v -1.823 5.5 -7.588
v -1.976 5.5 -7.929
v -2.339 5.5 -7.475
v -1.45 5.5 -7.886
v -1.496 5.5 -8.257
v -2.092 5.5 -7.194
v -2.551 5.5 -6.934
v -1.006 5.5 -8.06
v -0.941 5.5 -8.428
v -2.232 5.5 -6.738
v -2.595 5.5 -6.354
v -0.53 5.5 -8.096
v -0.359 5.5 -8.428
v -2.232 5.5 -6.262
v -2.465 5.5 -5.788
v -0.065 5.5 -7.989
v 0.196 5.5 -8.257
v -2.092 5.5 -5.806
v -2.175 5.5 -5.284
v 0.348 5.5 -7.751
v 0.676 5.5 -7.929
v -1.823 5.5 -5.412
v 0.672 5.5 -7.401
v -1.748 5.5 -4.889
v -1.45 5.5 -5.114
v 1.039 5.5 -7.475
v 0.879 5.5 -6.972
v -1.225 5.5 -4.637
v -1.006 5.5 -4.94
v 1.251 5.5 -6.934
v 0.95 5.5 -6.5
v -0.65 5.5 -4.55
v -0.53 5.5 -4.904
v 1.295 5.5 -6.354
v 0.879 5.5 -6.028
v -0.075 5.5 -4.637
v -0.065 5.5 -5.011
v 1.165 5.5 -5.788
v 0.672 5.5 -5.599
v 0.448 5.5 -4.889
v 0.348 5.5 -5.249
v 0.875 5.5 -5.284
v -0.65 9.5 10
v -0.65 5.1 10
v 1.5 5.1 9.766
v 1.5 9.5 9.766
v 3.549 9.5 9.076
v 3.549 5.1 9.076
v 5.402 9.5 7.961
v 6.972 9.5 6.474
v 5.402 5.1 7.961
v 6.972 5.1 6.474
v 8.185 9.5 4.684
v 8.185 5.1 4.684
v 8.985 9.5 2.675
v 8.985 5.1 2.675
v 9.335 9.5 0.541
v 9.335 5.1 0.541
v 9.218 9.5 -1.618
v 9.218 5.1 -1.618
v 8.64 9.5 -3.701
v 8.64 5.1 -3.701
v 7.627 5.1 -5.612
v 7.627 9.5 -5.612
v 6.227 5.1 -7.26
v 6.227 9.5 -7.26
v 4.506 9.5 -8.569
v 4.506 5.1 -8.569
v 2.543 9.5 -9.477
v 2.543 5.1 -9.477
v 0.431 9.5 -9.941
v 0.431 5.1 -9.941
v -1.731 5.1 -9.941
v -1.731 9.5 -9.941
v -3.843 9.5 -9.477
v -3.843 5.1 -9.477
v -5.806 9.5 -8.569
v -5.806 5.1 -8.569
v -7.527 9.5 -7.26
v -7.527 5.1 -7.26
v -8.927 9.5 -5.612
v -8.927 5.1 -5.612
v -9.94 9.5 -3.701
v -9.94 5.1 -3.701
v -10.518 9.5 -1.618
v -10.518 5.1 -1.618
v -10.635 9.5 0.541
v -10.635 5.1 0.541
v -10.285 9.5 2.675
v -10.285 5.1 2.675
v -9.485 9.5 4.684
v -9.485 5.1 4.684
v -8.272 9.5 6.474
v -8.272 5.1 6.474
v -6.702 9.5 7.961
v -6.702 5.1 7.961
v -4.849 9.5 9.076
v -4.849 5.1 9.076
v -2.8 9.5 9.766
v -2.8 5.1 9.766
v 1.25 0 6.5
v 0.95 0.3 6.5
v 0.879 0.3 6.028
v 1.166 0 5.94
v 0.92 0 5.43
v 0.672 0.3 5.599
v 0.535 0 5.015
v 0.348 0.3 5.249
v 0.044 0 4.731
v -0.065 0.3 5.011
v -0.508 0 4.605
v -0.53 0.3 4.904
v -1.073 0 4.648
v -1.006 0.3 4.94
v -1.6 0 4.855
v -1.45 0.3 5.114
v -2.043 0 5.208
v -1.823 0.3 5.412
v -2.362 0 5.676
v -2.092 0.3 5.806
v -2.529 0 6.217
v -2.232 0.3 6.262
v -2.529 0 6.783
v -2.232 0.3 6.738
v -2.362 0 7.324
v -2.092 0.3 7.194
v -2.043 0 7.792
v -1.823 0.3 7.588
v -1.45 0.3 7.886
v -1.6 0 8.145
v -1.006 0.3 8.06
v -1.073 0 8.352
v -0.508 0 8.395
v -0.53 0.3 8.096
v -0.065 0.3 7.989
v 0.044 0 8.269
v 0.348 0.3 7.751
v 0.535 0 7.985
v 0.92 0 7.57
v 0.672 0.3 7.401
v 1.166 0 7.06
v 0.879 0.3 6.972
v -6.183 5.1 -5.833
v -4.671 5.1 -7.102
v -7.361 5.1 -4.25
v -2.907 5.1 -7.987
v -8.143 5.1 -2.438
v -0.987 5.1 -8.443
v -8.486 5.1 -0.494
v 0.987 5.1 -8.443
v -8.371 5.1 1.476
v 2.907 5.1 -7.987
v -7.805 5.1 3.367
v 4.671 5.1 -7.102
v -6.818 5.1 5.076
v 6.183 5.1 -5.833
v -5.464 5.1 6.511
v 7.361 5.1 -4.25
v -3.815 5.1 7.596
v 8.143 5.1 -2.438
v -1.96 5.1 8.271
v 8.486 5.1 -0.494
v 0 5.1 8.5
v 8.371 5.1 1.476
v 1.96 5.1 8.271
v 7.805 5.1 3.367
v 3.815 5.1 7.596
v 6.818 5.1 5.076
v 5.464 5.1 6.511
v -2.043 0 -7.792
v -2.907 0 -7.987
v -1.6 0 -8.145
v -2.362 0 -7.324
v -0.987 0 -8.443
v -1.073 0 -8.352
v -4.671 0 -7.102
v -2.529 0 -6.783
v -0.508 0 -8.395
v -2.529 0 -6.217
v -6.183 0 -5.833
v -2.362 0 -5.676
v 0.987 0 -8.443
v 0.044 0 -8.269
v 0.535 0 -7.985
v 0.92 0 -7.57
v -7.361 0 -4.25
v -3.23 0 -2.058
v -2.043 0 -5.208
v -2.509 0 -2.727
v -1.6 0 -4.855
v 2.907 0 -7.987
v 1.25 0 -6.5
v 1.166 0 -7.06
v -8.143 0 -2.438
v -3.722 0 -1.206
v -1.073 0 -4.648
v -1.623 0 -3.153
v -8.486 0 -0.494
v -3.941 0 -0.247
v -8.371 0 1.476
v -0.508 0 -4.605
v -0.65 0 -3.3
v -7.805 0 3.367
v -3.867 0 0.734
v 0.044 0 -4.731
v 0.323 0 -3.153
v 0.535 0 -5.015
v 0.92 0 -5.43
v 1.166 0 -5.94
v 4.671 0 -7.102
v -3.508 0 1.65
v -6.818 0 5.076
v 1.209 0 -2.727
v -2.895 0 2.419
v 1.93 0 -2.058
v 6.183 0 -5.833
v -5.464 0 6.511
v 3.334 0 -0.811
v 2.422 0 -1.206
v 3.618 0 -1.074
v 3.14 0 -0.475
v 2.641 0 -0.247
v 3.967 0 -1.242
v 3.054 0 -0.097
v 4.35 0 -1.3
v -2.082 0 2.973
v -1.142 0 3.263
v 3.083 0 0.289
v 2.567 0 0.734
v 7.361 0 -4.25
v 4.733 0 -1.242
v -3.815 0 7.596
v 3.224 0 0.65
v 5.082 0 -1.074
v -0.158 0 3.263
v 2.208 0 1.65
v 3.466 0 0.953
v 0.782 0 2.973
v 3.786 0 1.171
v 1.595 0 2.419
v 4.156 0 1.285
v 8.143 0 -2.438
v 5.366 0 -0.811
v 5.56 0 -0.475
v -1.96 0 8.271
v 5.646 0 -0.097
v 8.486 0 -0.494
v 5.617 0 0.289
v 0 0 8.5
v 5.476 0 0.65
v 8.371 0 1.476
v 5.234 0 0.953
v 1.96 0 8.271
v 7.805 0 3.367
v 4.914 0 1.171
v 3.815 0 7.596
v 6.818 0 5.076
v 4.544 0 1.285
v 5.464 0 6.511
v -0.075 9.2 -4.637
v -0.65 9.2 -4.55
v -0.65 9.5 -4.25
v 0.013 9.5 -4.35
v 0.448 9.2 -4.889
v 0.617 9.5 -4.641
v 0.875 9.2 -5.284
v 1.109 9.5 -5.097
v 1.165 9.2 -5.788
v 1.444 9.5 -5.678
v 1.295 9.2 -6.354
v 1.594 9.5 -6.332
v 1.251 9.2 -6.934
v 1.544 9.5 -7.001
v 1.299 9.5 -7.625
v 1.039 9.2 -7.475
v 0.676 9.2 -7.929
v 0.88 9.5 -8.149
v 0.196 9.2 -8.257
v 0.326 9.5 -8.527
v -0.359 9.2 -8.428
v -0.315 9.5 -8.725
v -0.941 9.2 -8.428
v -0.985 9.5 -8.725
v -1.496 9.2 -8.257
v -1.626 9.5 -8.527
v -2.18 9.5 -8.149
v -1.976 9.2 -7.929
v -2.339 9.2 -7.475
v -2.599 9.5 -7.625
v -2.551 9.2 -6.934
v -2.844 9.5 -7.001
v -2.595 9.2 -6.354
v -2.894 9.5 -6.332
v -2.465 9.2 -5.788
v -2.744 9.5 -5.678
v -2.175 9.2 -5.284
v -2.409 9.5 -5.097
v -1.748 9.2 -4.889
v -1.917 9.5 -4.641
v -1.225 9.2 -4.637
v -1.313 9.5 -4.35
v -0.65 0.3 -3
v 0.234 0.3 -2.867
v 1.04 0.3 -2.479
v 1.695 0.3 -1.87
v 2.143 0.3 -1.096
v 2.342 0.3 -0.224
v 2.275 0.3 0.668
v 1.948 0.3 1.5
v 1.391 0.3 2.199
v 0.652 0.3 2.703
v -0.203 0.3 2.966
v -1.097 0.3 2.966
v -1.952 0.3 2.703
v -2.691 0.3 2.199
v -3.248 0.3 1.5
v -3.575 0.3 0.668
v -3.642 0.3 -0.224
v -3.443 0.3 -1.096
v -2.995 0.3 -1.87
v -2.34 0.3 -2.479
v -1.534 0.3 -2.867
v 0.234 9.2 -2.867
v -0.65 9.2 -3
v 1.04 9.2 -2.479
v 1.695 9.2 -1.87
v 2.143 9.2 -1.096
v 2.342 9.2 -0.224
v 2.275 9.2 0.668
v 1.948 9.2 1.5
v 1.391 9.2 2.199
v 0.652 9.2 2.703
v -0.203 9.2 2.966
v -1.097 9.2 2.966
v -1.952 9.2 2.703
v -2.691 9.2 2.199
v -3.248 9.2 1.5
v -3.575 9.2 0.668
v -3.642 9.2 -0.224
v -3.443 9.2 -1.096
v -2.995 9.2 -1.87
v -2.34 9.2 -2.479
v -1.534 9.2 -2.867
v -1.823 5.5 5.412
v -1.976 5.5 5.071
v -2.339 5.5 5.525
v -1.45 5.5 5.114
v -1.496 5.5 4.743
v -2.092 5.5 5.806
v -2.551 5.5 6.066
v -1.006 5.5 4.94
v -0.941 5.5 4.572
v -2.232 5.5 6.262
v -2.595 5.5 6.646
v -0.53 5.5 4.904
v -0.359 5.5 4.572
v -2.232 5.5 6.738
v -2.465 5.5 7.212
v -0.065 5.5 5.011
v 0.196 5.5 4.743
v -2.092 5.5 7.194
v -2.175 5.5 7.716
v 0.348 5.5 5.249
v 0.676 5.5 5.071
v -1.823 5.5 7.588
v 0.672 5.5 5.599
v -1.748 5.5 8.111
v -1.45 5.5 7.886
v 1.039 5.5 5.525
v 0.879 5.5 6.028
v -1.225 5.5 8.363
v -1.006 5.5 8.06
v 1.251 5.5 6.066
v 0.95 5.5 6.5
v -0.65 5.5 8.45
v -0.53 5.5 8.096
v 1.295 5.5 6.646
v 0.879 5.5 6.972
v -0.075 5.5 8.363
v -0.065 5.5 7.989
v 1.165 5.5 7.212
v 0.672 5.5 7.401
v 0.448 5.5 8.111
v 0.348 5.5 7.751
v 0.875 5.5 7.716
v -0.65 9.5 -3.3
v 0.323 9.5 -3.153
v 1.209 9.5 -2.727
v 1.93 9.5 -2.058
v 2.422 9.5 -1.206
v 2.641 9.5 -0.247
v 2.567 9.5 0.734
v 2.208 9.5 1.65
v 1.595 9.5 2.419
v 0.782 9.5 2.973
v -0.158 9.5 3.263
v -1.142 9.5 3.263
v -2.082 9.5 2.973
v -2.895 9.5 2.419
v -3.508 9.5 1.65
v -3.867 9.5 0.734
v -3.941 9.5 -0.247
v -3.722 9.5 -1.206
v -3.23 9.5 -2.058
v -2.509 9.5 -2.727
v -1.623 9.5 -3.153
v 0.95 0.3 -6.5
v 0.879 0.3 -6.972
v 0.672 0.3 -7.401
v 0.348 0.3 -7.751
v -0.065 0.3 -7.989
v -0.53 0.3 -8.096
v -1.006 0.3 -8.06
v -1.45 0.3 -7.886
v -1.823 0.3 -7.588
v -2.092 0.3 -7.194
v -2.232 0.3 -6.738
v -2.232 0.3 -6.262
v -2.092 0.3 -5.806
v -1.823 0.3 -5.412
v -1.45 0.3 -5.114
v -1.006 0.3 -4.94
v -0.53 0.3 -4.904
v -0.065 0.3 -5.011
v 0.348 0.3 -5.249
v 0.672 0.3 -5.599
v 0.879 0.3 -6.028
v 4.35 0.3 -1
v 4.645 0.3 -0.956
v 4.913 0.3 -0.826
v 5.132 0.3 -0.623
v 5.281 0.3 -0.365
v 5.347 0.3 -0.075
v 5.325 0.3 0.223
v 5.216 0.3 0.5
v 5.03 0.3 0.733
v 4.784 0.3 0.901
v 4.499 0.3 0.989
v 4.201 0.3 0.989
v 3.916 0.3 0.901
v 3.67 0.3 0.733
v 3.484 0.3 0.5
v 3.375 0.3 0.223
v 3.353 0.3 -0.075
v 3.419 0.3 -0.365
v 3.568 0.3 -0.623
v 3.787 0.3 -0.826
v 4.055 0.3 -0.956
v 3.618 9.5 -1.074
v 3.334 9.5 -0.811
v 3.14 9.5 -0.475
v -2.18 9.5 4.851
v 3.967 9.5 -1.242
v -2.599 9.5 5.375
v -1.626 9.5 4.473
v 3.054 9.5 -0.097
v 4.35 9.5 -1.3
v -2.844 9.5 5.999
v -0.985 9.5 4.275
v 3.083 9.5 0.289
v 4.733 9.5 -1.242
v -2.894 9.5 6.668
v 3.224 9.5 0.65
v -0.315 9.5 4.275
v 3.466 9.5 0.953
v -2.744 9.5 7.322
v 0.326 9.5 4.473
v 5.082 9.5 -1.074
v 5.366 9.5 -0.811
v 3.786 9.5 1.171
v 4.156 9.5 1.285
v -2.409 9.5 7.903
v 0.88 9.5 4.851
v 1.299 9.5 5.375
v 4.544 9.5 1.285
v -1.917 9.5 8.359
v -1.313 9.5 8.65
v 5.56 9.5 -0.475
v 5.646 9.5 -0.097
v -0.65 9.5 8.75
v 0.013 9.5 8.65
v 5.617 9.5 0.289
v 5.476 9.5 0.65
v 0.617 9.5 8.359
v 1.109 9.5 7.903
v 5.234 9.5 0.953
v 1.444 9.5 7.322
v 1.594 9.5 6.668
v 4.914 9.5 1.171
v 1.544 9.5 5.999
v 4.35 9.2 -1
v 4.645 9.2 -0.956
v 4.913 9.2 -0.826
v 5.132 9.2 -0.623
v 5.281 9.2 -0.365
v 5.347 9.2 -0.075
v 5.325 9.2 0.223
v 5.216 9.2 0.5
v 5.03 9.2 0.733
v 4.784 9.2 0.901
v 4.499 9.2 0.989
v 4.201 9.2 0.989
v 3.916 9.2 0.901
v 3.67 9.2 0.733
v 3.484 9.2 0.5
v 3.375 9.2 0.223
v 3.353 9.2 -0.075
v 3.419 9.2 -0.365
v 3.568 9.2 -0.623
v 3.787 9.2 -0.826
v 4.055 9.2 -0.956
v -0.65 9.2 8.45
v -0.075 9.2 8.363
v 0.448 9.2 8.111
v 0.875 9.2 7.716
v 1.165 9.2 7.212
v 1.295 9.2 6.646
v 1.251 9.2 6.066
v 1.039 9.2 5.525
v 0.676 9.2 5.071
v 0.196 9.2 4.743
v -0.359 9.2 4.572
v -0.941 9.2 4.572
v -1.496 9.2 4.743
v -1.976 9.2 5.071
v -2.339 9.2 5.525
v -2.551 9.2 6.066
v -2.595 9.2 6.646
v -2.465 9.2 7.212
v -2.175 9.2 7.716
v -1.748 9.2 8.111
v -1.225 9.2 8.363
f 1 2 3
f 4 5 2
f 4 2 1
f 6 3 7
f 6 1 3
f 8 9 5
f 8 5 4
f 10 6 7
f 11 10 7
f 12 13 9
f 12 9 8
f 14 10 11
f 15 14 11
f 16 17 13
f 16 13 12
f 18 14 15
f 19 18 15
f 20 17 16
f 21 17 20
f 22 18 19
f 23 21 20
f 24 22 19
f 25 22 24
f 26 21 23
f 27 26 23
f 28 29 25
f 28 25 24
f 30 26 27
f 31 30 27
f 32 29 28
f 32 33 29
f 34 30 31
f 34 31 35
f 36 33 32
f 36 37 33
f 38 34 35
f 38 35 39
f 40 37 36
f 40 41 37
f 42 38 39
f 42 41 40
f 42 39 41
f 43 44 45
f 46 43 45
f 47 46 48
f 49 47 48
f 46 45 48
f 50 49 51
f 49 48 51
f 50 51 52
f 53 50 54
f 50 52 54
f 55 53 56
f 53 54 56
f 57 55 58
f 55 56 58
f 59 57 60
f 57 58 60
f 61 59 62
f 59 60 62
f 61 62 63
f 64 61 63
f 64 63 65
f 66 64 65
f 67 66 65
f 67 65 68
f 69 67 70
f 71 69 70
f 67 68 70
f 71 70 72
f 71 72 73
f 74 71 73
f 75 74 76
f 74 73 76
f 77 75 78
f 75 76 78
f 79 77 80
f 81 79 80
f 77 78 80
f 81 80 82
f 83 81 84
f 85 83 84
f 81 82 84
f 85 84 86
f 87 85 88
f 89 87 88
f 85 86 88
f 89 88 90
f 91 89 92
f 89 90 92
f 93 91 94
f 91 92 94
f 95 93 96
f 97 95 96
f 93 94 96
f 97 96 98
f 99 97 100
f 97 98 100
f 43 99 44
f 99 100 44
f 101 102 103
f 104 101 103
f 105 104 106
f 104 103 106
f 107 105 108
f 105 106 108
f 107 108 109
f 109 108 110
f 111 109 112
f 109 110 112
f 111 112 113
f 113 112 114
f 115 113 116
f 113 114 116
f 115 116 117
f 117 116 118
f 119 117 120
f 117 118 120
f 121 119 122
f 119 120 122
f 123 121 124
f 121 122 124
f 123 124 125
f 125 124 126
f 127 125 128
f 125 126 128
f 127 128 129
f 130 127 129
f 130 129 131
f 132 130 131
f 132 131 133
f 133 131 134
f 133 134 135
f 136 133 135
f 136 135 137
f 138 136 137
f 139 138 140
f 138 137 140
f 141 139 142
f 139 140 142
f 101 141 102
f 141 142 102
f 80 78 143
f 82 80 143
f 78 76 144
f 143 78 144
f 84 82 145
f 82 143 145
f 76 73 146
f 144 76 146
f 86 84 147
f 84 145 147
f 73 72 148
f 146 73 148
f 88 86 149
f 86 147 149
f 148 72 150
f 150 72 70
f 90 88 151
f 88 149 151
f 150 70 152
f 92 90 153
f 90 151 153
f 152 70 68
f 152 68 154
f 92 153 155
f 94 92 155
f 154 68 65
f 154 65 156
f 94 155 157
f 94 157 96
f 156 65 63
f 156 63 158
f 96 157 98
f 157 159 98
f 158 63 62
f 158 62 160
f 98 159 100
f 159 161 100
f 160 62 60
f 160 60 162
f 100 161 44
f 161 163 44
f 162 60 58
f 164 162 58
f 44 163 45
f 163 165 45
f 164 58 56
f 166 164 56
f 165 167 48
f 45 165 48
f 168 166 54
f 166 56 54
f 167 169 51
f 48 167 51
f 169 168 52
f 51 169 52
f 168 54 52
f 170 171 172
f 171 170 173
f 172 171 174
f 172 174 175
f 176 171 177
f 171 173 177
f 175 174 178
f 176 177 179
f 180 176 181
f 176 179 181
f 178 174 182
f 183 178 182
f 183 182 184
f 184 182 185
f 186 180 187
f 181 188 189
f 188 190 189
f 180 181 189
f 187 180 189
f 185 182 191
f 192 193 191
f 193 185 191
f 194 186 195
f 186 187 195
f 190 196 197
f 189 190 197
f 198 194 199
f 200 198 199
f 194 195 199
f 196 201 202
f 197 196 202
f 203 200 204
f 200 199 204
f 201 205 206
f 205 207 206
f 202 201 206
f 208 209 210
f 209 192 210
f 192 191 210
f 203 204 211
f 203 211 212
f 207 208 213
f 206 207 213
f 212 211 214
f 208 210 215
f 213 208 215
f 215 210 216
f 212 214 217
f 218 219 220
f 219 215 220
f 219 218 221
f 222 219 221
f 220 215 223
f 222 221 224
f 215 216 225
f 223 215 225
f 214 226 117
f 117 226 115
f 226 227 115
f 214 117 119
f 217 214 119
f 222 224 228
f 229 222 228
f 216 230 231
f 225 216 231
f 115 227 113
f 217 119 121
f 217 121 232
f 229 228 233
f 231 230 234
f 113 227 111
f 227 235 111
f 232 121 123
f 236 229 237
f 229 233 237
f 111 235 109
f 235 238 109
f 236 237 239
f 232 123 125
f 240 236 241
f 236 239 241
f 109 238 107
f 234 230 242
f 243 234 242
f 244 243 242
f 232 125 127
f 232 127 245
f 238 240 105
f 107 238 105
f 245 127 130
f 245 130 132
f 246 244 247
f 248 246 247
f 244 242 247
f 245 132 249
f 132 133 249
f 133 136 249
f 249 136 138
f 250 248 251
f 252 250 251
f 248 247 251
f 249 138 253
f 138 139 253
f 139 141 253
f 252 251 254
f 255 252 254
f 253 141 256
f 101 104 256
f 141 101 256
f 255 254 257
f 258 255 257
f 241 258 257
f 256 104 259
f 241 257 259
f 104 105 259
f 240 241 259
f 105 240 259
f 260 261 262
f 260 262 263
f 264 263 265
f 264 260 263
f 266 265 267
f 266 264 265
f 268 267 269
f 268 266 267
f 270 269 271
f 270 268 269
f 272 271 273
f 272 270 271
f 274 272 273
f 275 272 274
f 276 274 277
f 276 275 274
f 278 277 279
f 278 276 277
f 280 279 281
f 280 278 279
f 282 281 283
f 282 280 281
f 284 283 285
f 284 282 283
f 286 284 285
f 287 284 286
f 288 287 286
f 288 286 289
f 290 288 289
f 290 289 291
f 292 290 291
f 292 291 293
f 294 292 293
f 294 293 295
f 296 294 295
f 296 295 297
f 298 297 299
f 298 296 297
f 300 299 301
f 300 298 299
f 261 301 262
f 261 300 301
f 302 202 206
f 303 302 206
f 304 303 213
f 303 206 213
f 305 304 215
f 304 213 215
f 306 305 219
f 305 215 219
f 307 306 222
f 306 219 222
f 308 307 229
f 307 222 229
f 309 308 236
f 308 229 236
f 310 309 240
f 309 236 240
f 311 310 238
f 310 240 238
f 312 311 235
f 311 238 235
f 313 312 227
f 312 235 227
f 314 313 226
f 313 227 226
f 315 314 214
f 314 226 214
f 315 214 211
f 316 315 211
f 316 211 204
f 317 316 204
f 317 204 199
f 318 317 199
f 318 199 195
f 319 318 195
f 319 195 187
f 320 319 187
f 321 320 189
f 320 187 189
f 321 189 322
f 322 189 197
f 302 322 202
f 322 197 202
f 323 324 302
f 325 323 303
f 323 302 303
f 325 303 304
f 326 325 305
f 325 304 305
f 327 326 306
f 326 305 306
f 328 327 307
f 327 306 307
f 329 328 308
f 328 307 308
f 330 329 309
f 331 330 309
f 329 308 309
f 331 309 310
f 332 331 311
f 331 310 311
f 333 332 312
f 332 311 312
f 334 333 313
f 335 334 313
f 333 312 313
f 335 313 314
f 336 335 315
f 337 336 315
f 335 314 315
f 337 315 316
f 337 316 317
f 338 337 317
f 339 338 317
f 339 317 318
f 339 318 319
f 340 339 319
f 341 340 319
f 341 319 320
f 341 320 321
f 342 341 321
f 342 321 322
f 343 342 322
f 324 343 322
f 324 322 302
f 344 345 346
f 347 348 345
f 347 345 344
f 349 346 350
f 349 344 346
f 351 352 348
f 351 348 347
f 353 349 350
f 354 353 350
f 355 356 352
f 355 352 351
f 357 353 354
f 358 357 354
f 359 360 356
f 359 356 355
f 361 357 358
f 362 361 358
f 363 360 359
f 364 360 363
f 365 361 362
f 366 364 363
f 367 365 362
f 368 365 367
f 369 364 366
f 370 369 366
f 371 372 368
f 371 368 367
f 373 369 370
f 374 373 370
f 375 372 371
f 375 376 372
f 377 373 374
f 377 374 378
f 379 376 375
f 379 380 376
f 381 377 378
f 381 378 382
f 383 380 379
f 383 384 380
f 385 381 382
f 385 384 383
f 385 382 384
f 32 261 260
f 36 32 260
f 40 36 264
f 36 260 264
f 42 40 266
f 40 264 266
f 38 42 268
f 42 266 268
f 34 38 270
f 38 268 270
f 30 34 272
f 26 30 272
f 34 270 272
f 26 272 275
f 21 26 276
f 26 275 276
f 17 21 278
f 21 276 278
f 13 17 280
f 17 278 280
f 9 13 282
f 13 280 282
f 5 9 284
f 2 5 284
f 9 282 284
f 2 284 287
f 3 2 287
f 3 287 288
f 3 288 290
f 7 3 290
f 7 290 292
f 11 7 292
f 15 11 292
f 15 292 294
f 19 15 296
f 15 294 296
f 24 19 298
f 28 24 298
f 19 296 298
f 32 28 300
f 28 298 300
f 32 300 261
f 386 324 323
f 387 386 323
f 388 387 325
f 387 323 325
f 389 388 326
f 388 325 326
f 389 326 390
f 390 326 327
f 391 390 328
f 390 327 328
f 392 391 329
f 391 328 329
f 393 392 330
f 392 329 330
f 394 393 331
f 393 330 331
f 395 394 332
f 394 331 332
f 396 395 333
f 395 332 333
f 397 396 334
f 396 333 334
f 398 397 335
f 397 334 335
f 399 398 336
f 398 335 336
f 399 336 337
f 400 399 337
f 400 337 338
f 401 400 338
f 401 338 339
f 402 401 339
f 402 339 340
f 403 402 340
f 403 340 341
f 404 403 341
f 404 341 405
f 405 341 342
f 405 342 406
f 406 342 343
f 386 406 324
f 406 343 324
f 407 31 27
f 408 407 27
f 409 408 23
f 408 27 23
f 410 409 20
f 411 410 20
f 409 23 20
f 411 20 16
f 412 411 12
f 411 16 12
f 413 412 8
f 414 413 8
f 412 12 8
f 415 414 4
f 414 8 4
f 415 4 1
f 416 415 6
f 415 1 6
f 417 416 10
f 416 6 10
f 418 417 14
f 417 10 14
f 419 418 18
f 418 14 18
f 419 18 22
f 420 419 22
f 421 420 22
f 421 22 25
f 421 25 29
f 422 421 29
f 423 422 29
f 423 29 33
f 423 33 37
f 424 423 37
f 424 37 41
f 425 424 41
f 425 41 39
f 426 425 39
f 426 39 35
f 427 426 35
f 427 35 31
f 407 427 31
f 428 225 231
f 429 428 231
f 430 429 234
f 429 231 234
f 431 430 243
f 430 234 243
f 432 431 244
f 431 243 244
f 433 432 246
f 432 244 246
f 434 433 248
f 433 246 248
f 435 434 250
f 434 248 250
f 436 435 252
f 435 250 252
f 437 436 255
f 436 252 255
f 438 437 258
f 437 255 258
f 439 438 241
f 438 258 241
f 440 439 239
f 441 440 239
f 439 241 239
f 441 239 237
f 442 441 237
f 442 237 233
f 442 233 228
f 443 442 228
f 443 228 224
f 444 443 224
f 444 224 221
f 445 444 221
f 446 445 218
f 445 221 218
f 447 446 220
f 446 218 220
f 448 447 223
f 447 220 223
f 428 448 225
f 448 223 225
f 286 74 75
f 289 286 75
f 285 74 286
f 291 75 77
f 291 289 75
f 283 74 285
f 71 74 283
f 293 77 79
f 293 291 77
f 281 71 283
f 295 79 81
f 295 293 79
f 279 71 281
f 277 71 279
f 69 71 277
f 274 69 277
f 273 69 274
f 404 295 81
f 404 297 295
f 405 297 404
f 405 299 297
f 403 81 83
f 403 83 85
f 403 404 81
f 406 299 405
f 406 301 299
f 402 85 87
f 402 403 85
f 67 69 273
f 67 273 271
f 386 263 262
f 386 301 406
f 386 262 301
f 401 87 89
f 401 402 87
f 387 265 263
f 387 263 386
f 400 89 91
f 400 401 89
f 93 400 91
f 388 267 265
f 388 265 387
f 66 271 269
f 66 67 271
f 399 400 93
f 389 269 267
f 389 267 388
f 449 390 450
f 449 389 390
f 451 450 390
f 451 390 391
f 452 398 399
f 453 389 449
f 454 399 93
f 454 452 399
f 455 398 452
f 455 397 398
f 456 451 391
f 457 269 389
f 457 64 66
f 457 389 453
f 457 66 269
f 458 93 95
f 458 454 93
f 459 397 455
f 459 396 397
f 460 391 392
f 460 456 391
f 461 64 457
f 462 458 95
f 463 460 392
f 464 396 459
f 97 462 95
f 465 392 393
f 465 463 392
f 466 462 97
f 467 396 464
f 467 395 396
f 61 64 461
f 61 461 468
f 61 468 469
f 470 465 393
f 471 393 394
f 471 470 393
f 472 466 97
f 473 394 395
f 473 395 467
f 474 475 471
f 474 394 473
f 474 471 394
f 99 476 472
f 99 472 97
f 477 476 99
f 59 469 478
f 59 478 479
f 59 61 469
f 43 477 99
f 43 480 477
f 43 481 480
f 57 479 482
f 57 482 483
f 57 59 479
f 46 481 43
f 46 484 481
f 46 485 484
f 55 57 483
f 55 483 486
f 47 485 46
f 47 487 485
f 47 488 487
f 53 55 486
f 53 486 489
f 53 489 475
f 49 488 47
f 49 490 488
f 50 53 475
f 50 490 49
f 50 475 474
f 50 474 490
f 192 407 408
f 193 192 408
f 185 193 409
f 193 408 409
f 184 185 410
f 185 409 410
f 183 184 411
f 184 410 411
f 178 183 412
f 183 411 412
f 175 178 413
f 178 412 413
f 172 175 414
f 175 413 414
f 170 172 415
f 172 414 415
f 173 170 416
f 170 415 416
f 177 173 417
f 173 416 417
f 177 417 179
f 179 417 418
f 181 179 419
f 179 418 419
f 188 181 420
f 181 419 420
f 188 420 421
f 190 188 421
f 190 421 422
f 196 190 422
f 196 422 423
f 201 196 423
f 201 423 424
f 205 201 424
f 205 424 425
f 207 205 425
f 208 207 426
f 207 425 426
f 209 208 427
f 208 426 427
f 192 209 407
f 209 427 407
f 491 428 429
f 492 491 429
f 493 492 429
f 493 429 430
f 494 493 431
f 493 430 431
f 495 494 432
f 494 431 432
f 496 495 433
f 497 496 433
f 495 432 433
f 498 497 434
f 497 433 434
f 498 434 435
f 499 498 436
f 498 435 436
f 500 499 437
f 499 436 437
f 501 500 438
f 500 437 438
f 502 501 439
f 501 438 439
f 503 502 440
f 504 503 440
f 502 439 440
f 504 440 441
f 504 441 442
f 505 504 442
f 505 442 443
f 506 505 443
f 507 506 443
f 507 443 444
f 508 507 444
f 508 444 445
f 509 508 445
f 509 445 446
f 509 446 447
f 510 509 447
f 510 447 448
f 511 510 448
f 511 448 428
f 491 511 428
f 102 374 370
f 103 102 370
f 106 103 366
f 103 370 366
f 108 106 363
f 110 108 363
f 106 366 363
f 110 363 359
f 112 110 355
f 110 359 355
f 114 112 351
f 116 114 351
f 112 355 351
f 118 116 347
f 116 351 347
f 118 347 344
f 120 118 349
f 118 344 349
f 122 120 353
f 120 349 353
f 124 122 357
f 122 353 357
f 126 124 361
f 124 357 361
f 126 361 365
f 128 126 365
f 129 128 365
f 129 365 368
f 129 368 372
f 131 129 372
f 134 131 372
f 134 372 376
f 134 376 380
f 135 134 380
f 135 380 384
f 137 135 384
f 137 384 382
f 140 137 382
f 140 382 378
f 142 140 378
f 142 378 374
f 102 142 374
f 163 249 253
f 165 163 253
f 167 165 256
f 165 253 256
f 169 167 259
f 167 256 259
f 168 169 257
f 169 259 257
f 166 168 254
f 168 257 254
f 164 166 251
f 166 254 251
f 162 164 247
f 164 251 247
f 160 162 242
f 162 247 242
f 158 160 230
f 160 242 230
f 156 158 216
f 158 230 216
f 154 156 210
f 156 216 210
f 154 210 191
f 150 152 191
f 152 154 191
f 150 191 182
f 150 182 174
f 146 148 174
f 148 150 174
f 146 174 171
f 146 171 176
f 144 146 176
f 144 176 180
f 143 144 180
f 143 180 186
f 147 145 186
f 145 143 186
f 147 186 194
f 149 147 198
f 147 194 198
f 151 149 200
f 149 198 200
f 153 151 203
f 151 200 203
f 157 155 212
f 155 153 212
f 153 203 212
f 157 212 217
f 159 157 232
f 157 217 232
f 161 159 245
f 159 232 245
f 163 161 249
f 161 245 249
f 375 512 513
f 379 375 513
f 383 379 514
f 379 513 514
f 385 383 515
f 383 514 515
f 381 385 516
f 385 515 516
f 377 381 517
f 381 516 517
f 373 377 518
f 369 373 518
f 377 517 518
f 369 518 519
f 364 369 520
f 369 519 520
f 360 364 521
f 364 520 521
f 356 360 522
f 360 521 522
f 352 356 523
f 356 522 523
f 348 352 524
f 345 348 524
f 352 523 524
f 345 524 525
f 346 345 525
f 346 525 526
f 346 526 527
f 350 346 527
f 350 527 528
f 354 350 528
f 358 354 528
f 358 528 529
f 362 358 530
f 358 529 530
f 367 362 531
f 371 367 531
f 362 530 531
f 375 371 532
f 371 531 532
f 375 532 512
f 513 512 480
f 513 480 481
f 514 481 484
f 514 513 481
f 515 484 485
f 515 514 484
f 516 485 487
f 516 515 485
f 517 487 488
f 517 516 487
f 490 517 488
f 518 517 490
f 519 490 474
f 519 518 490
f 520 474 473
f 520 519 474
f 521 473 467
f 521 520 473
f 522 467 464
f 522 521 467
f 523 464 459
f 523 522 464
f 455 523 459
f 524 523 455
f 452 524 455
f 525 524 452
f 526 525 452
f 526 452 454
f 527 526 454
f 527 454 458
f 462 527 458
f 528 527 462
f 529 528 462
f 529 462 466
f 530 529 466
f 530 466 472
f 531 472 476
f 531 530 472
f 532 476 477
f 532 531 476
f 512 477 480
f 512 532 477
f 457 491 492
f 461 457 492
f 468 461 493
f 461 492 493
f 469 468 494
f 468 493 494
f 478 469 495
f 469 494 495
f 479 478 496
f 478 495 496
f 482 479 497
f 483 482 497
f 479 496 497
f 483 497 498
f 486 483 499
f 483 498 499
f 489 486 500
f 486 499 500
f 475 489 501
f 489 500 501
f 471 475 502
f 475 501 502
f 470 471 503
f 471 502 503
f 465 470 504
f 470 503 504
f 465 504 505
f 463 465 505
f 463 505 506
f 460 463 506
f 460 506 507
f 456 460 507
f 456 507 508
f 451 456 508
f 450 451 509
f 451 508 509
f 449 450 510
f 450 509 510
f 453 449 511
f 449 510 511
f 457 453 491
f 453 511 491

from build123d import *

# Parameters (mm, degrees)
SKETCH1_R                  = 8.5
BOSS_EXTRUDE1_DEPTH        = 5.5
BOSS_EXTRUDE2_DEPTH        = 4
BOSS_EXTRUDE2_DEPTH_BACK   = 0.4
SKETCH2_R                  = 10
SKETCH3_R                  = 3
CUT_EXTRUDE1_DEPTH         = 18.426201537
SKETCH6_R                  = 1
CUT_EXTRUDE4_DEPTH         = 18.426201537
F_3_2_3_2_DIAMETER_HOLE1_D = 3.2
SKETCH10_R                 = 1.95
CUT_EXTRUDE5_DEPTH         = 4
CHAMFER1_SIZE              = 0.3


with BuildPart() as part:
    # Sketch1 → Boss-Extrude1 (new body)
    with BuildSketch(Plane(origin=(0, 0, 0), x_dir=(1, 0, 0), z_dir=(0, 1, 0))):
        with Locations(Location((0, 0, 0), (0, 0, 270))):
            Circle(SKETCH1_R)
    extrude(amount=BOSS_EXTRUDE1_DEPTH)

    # Sketch2 → Boss-Extrude2 (add, two sides: drawn at the far end of the back side and taken through both)
    with BuildSketch(Plane(origin=(0, 5.5, 0), x_dir=(1, 0, 0), z_dir=(0, 1, 0)).offset(-BOSS_EXTRUDE2_DEPTH_BACK)):
        with Locations(Location((-0.65, 0, 0), (0, 0, 270))):
            Circle(SKETCH2_R)
    extrude(amount=BOSS_EXTRUDE2_DEPTH + BOSS_EXTRUDE2_DEPTH_BACK)

    # Sketch3 → Cut-Extrude1 (cut, through all)
    with BuildSketch(Plane.XZ):
        with Locations(Location((-0.65, 0, 0), (0, 0, 270))):
            Circle(SKETCH3_R)
    extrude(amount=-CUT_EXTRUDE1_DEPTH, mode=Mode.SUBTRACT)

    # Sketch6 → Cut-Extrude4 (cut, through all)
    with BuildSketch(Plane.XZ):
        with Locations(Location((4.35, 0, 0), (0, 0, 270))):
            Circle(SKETCH6_R)
    extrude(amount=-CUT_EXTRUDE4_DEPTH, mode=Mode.SUBTRACT)

    # Ø3.2 (3.2) Diameter Hole1 (through all)
    with Locations(Plane(origin=(0, 0, 0), x_dir=(-1, 0, 0), z_dir=(0, -1, 0))):
        with Locations((0.65, 6.5), (0.65, -6.5)):
            Hole(F_3_2_3_2_DIAMETER_HOLE1_D / 2)

    # Sketch10 → Cut-Extrude5 (cut)
    with BuildSketch(Plane(origin=(0, 9.5, 0), x_dir=(1, 0, 0), z_dir=(0, 1, 0))):
        with Locations(Location((-0.65, 6.5, 0), (0, 0, 270))):
            Circle(SKETCH10_R)
        with Locations(Location((-0.65, -6.5, 0), (0, 0, 270))):
            Circle(SKETCH10_R)
    extrude(amount=-CUT_EXTRUDE5_DEPTH, mode=Mode.SUBTRACT)

    # Chamfer1
    chamfer1_edges = [part.edges().sort_by_distance(p)[0] for p in [
        (-0.65, 9.5, 3),
        (-0.65, 0, 3),
        (4.35, 9.5, 1),
        (4.35, 0, 1),
        (-2.25, 0, 6.5),
        (-2.25, 0, -6.5),
        (-0.65, 9.5, -8.45),
        (-0.65, 9.5, 4.55),
    ]]
    chamfer(chamfer1_edges, length=CHAMFER1_SIZE)


solid = part.part
